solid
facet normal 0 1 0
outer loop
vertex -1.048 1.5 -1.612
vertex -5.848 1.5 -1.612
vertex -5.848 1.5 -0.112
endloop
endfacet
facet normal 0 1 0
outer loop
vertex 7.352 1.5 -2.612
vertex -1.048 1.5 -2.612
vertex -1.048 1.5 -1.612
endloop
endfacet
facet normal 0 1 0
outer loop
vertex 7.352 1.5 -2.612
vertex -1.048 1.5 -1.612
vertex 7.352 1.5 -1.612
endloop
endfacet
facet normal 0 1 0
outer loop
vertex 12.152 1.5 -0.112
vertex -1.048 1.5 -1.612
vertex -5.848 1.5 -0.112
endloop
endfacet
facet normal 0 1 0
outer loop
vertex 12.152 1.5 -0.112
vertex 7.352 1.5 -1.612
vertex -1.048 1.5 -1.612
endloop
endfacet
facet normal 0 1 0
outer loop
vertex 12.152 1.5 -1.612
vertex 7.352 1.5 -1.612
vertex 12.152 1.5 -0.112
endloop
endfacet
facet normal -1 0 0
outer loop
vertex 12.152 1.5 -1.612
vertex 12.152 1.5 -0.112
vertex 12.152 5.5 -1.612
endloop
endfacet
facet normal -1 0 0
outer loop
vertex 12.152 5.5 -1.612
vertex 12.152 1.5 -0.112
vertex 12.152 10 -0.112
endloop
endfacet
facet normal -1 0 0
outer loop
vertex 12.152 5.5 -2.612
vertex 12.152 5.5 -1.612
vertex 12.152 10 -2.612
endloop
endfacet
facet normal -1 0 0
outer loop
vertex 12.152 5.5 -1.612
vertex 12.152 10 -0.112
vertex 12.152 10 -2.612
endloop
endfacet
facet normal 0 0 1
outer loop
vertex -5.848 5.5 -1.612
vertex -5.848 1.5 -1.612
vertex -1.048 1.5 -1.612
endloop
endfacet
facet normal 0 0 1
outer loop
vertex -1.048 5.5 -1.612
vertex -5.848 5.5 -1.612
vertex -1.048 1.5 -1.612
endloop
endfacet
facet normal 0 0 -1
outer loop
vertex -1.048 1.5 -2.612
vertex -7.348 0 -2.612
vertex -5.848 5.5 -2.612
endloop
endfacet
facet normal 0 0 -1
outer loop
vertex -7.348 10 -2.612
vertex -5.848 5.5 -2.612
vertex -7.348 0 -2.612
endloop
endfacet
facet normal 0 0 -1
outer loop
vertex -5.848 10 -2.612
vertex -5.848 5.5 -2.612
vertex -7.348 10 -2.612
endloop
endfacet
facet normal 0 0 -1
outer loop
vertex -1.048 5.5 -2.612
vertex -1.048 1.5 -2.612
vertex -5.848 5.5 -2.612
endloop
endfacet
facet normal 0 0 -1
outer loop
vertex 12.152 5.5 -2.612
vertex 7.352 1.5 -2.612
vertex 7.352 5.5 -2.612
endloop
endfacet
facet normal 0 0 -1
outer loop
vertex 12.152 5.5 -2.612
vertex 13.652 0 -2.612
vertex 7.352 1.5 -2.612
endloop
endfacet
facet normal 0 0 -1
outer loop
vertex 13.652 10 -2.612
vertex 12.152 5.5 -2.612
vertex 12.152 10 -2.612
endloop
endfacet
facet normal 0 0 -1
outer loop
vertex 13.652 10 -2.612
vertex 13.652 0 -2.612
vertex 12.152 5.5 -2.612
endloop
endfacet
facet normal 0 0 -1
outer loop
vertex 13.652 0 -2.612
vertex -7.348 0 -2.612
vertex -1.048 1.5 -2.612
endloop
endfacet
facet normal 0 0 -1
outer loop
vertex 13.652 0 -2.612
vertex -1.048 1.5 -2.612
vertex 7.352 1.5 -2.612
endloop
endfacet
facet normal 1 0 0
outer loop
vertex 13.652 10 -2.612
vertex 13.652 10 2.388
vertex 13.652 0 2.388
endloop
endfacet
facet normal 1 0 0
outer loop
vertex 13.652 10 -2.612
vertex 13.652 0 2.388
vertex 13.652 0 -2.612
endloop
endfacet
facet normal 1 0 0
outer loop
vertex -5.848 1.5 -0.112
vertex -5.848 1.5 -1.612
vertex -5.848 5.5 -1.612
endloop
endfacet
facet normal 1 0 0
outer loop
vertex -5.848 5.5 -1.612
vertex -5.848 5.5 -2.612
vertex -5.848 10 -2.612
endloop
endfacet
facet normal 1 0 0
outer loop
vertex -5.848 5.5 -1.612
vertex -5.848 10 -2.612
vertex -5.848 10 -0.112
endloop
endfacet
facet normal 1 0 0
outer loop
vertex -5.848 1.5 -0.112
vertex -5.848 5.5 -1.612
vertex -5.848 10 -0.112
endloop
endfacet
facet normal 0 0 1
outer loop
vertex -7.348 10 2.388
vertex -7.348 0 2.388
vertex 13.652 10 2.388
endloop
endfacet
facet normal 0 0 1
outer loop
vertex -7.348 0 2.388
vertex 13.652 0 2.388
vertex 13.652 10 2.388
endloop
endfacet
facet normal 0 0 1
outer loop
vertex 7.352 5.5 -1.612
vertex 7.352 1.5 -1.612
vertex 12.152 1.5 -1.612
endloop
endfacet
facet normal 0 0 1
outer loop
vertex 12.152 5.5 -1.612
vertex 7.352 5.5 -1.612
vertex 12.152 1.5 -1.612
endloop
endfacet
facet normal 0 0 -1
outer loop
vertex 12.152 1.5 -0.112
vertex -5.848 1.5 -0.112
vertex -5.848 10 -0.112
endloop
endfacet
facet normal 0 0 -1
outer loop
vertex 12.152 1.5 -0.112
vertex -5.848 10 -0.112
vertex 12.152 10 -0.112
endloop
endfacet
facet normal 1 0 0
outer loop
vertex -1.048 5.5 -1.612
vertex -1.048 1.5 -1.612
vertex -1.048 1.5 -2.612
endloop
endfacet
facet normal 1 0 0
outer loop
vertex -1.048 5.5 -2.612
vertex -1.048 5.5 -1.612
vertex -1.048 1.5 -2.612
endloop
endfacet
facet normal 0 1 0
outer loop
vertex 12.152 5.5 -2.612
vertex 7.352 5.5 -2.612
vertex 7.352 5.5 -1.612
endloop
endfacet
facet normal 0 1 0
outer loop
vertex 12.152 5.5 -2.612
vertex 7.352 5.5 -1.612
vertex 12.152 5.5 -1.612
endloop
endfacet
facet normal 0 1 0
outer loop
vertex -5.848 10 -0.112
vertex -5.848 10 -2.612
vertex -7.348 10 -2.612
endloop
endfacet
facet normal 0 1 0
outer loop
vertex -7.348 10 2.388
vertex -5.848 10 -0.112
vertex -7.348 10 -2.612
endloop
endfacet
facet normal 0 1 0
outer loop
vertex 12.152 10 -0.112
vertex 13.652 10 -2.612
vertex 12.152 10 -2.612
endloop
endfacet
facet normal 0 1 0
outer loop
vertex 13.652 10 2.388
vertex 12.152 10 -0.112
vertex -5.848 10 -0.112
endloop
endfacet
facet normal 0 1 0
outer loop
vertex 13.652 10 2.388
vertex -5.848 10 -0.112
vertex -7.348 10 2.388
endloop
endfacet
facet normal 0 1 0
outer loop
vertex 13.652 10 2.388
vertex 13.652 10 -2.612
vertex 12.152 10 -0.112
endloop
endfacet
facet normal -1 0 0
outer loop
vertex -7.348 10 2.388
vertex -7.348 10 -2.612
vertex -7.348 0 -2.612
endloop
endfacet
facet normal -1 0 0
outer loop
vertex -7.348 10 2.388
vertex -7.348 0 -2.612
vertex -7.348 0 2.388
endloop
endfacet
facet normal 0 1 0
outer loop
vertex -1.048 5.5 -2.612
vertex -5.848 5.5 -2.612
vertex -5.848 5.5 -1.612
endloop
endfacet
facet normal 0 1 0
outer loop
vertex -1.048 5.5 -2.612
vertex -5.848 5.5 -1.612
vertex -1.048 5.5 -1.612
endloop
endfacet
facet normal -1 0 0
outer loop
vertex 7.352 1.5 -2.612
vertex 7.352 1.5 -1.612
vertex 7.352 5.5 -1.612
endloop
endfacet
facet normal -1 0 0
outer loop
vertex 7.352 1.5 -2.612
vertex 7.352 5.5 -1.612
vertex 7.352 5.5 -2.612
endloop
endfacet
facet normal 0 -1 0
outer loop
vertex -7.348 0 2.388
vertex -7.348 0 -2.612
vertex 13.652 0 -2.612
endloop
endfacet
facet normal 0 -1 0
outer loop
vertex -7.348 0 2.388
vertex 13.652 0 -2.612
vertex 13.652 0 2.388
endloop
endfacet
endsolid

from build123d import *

# Parameters (mm, degrees)
SKETCH1_W           = 18
SKETCH1_H           = 5
BOSS_EXTRUDE1_DEPTH = 1.5
SKETCH2_W           = 18
SKETCH2_H           = 2.5
SKETCH2_W_2         = 4.8
SKETCH2_H_2         = 1
BOSS_EXTRUDE3_DEPTH = 4
SKETCH4_W           = 18
SKETCH4_H           = 2.5
BOSS_EXTRUDE4_DEPTH = 4.5
SKETCH6_W           = 5
SKETCH6_H           = 10
BOSS_EXTRUDE5_DEPTH = 1.5
SKETCH7_W           = 5
SKETCH7_H           = 10
BOSS_EXTRUDE6_DEPTH = 1.5


with BuildPart() as part:
    # Sketch1 → Boss-Extrude1 (new body)
    with BuildSketch(Plane(origin=(0, 0, 0), x_dir=(1, 0, 0), z_dir=(0, 1, 0))):
        with Locations((3.151785714, 0.111607143)):
            Rectangle(SKETCH1_W, SKETCH1_H)
    extrude(amount=BOSS_EXTRUDE1_DEPTH)

    # Sketch2 → Boss-Extrude3 (add)
    with BuildSketch(Plane(origin=(0, 1.5, 0), x_dir=(1, 0, 0), z_dir=(0, 1, 0))):
        with Locations((3.151785714, -1.138392857)):
            Rectangle(SKETCH2_W, SKETCH2_H)
        with Locations((-3.448214286, 2.111607143)):
            Rectangle(SKETCH2_W_2, SKETCH2_H_2)
        with Locations((9.751785714, 2.111607143)):
            Rectangle(SKETCH2_W_2, SKETCH2_H_2)
    extrude(amount=BOSS_EXTRUDE3_DEPTH)

    # Sketch4 → Boss-Extrude4 (add)
    with BuildSketch(Plane(origin=(0, 5.5, 0), x_dir=(1, 0, 0), z_dir=(0, 1, 0))):
        with Locations((3.151785714, -1.138392857)):
            Rectangle(SKETCH4_W, SKETCH4_H)
    extrude(amount=BOSS_EXTRUDE4_DEPTH)

    # Sketch6 → Boss-Extrude5 (add)
    with BuildSketch(Plane(origin=(12.151785714, 0, 0), x_dir=(0, 0, -1), z_dir=(1, 0, 0))):
        with Locations((0.111607143, 5)):
            Rectangle(SKETCH6_W, SKETCH6_H)
    extrude(amount=BOSS_EXTRUDE5_DEPTH)

    # Sketch7 → Boss-Extrude6 (add)
    with BuildSketch(Plane.ZY.offset(5.848214286)):
        with Locations((-0.111607143, 5)):
            Rectangle(SKETCH7_W, SKETCH7_H)
    extrude(amount=BOSS_EXTRUDE6_DEPTH)


solid = part.part
